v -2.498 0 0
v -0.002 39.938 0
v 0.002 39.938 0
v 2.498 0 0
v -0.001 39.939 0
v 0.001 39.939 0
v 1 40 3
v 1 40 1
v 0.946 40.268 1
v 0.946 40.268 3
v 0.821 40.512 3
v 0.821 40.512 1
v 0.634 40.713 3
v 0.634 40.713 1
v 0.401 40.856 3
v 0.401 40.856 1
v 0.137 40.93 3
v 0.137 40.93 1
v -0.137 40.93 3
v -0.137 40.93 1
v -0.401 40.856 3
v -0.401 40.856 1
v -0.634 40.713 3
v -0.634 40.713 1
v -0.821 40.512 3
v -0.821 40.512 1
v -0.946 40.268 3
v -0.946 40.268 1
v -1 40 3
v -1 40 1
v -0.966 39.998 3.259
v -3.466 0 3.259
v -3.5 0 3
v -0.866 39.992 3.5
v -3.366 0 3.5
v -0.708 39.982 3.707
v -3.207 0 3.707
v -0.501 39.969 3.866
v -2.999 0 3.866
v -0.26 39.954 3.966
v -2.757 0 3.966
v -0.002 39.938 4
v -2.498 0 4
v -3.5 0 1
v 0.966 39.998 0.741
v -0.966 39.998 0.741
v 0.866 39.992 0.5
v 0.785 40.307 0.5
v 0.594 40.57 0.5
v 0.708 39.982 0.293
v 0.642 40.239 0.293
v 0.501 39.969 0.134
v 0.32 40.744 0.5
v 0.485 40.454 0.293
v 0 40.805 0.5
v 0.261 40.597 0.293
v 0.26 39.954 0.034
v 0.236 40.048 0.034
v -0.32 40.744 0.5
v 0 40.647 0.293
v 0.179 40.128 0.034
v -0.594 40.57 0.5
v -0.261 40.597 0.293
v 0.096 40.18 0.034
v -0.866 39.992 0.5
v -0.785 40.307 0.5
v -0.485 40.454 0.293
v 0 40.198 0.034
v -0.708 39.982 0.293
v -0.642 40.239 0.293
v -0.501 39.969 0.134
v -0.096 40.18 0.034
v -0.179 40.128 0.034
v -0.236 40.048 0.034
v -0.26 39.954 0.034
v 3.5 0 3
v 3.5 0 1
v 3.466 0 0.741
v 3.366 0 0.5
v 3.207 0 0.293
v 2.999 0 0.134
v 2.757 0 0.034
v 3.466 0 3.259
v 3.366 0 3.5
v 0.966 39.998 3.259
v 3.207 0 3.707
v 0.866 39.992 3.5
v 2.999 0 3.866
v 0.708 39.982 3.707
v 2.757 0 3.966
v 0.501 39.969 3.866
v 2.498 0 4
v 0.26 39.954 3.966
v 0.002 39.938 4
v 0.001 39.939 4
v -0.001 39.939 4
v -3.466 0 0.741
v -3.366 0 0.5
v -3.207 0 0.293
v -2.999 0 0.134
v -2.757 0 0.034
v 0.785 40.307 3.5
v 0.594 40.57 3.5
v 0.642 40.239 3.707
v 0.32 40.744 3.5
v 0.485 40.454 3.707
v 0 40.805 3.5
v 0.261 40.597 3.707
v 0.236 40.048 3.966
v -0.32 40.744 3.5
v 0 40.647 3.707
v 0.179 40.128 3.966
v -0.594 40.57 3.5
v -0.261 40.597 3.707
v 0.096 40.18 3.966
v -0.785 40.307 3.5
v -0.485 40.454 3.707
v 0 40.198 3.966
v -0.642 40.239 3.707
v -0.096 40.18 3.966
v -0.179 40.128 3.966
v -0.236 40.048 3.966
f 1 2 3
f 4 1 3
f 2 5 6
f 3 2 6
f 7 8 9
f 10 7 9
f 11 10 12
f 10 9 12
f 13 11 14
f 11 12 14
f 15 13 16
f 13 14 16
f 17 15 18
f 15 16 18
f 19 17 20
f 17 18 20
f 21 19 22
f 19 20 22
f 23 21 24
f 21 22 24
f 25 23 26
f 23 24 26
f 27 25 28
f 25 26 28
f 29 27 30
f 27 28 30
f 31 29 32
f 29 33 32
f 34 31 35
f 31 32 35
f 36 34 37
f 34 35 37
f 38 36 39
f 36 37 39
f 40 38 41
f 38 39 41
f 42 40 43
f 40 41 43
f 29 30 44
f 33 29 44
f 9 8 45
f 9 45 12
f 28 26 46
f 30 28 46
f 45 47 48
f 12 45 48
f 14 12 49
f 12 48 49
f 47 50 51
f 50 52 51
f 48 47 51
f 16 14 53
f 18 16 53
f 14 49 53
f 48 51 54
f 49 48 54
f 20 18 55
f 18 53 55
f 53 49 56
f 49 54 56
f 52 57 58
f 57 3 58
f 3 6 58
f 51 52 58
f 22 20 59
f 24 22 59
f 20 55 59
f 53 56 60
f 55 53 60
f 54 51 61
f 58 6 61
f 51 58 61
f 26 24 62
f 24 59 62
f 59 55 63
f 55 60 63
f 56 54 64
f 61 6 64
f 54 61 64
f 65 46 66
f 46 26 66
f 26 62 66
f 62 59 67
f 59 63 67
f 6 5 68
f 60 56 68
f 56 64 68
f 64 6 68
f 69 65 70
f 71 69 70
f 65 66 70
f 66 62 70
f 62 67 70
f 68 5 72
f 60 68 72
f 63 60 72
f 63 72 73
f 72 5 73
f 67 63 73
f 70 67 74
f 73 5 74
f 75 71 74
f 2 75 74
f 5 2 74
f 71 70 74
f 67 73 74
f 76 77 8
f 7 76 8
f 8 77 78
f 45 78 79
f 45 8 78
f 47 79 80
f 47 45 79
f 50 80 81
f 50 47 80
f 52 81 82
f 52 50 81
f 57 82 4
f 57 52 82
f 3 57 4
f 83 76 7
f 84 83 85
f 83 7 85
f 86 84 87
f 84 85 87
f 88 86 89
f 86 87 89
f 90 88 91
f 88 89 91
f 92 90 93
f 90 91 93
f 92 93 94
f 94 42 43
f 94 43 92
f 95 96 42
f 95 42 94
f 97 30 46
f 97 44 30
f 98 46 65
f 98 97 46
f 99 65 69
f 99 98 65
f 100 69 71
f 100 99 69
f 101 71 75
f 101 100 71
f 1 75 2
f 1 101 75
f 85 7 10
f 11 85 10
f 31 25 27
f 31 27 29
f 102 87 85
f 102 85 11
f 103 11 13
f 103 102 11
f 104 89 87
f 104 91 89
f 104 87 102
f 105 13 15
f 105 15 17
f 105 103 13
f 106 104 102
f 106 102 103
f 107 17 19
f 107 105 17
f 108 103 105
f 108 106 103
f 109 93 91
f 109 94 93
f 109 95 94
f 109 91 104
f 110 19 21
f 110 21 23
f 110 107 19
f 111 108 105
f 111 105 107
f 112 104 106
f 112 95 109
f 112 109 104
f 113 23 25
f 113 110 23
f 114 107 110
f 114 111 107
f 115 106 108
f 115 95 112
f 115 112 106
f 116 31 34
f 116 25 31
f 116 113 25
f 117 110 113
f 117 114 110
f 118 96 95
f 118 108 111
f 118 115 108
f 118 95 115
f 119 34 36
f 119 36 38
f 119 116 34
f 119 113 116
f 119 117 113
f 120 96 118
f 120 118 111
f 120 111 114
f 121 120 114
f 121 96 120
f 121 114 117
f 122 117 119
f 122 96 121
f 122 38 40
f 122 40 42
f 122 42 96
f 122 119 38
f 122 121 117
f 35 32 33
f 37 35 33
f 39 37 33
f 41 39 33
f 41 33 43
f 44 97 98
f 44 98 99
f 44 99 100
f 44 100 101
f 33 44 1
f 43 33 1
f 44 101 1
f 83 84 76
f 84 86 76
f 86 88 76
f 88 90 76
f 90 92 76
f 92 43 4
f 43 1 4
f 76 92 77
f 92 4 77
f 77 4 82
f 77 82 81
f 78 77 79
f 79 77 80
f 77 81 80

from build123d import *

# Parameters (mm, degrees)
F1_DEPTH = 4
F2_R     = 1


with BuildPart() as f1:
    # F0 (on Top) → F1 (new body)
    with BuildSketch(Plane.XY):
        with BuildLine():
            Line((-1, 40), (-3.5, 0))
            Line((-3.5, 0), (3.5, 0))
            Line((3.5, 0), (1, 40))
            ThreePointArc((1, 40), (0, 40.939451), (-1, 40))
        make_face()
    extrude(amount=F1_DEPTH)

    # F2
    f2_edges = [f1.edges().sort_by_distance(p)[0] for p in [
        (-2.25, 20, 4),
        (-2.25, 20, 0),
        (2.25, 20, 4),
        (2.25, 20, 0),
    ]]
    fillet(f2_edges, radius=F2_R)


solid = f1.part
